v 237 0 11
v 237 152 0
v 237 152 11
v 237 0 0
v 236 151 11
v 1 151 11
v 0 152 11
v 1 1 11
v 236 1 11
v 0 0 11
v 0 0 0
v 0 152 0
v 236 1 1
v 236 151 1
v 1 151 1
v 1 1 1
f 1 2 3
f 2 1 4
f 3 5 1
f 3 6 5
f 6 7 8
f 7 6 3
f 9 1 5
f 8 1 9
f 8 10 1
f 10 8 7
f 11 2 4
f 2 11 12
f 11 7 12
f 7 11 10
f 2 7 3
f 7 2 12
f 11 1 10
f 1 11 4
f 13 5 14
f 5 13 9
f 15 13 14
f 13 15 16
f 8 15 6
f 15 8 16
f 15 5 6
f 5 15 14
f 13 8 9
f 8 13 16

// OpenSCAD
// file: _common.scad
$fa=4; // default minimum facet angle is now 0.5
$fs=0.05; // default minimum facet size is now 0.05 mm

solderSuckerWidth = 20;

handleLen = 115;
handleWidth = 19;

tipLen = handleLen;
tipWidth = 12;

holderLen = handleLen;
holderWidth = 14;

holderBaseLen = 15;
holderBaseWidth = 12.75;

wallThickness = 5;

totalHeight = 75;

totalWidth = 235;
totalLen = solderSuckerWidth + handleLen + wallThickness * 3;

spongeHolderWidth = 12.5;
spongeHolderLen = 30;
spongeHolderHeight = 20;

chargerWidth = 60;
chargerHeight = 30;
chargerLen = 60;

helpingHandHoleRad = 6.3;
helpingHandHoleDepth = 15;

middleXDim = totalWidth - (handleWidth + tipWidth * 2 + wallThickness * 7) - (holderWidth + chargerHeight);
middleYDim = totalLen - wallThickness * 3 - solderSuckerWidth;
middleZDim = totalHeight - wallThickness;

solderSuckerLen = totalWidth - (holderWidth + chargerHeight + wallThickness * 4);

powerBrickSide = 41;
powerBrickLen = 76;
powerBrickPlugRad = 10;

m2ThreadRad = 1;
m2ThreadDepth = 25;
// main file
include <./_common.scad>;

lidWallThickness = 1;
lidHeight = 10;

difference() {
  cube([totalWidth + lidWallThickness * 2, totalLen + lidWallThickness * 2, lidHeight + lidWallThickness]);
  translate([lidWallThickness, lidWallThickness, lidWallThickness]) cube([totalWidth, totalLen, lidHeight + .01]);
}
